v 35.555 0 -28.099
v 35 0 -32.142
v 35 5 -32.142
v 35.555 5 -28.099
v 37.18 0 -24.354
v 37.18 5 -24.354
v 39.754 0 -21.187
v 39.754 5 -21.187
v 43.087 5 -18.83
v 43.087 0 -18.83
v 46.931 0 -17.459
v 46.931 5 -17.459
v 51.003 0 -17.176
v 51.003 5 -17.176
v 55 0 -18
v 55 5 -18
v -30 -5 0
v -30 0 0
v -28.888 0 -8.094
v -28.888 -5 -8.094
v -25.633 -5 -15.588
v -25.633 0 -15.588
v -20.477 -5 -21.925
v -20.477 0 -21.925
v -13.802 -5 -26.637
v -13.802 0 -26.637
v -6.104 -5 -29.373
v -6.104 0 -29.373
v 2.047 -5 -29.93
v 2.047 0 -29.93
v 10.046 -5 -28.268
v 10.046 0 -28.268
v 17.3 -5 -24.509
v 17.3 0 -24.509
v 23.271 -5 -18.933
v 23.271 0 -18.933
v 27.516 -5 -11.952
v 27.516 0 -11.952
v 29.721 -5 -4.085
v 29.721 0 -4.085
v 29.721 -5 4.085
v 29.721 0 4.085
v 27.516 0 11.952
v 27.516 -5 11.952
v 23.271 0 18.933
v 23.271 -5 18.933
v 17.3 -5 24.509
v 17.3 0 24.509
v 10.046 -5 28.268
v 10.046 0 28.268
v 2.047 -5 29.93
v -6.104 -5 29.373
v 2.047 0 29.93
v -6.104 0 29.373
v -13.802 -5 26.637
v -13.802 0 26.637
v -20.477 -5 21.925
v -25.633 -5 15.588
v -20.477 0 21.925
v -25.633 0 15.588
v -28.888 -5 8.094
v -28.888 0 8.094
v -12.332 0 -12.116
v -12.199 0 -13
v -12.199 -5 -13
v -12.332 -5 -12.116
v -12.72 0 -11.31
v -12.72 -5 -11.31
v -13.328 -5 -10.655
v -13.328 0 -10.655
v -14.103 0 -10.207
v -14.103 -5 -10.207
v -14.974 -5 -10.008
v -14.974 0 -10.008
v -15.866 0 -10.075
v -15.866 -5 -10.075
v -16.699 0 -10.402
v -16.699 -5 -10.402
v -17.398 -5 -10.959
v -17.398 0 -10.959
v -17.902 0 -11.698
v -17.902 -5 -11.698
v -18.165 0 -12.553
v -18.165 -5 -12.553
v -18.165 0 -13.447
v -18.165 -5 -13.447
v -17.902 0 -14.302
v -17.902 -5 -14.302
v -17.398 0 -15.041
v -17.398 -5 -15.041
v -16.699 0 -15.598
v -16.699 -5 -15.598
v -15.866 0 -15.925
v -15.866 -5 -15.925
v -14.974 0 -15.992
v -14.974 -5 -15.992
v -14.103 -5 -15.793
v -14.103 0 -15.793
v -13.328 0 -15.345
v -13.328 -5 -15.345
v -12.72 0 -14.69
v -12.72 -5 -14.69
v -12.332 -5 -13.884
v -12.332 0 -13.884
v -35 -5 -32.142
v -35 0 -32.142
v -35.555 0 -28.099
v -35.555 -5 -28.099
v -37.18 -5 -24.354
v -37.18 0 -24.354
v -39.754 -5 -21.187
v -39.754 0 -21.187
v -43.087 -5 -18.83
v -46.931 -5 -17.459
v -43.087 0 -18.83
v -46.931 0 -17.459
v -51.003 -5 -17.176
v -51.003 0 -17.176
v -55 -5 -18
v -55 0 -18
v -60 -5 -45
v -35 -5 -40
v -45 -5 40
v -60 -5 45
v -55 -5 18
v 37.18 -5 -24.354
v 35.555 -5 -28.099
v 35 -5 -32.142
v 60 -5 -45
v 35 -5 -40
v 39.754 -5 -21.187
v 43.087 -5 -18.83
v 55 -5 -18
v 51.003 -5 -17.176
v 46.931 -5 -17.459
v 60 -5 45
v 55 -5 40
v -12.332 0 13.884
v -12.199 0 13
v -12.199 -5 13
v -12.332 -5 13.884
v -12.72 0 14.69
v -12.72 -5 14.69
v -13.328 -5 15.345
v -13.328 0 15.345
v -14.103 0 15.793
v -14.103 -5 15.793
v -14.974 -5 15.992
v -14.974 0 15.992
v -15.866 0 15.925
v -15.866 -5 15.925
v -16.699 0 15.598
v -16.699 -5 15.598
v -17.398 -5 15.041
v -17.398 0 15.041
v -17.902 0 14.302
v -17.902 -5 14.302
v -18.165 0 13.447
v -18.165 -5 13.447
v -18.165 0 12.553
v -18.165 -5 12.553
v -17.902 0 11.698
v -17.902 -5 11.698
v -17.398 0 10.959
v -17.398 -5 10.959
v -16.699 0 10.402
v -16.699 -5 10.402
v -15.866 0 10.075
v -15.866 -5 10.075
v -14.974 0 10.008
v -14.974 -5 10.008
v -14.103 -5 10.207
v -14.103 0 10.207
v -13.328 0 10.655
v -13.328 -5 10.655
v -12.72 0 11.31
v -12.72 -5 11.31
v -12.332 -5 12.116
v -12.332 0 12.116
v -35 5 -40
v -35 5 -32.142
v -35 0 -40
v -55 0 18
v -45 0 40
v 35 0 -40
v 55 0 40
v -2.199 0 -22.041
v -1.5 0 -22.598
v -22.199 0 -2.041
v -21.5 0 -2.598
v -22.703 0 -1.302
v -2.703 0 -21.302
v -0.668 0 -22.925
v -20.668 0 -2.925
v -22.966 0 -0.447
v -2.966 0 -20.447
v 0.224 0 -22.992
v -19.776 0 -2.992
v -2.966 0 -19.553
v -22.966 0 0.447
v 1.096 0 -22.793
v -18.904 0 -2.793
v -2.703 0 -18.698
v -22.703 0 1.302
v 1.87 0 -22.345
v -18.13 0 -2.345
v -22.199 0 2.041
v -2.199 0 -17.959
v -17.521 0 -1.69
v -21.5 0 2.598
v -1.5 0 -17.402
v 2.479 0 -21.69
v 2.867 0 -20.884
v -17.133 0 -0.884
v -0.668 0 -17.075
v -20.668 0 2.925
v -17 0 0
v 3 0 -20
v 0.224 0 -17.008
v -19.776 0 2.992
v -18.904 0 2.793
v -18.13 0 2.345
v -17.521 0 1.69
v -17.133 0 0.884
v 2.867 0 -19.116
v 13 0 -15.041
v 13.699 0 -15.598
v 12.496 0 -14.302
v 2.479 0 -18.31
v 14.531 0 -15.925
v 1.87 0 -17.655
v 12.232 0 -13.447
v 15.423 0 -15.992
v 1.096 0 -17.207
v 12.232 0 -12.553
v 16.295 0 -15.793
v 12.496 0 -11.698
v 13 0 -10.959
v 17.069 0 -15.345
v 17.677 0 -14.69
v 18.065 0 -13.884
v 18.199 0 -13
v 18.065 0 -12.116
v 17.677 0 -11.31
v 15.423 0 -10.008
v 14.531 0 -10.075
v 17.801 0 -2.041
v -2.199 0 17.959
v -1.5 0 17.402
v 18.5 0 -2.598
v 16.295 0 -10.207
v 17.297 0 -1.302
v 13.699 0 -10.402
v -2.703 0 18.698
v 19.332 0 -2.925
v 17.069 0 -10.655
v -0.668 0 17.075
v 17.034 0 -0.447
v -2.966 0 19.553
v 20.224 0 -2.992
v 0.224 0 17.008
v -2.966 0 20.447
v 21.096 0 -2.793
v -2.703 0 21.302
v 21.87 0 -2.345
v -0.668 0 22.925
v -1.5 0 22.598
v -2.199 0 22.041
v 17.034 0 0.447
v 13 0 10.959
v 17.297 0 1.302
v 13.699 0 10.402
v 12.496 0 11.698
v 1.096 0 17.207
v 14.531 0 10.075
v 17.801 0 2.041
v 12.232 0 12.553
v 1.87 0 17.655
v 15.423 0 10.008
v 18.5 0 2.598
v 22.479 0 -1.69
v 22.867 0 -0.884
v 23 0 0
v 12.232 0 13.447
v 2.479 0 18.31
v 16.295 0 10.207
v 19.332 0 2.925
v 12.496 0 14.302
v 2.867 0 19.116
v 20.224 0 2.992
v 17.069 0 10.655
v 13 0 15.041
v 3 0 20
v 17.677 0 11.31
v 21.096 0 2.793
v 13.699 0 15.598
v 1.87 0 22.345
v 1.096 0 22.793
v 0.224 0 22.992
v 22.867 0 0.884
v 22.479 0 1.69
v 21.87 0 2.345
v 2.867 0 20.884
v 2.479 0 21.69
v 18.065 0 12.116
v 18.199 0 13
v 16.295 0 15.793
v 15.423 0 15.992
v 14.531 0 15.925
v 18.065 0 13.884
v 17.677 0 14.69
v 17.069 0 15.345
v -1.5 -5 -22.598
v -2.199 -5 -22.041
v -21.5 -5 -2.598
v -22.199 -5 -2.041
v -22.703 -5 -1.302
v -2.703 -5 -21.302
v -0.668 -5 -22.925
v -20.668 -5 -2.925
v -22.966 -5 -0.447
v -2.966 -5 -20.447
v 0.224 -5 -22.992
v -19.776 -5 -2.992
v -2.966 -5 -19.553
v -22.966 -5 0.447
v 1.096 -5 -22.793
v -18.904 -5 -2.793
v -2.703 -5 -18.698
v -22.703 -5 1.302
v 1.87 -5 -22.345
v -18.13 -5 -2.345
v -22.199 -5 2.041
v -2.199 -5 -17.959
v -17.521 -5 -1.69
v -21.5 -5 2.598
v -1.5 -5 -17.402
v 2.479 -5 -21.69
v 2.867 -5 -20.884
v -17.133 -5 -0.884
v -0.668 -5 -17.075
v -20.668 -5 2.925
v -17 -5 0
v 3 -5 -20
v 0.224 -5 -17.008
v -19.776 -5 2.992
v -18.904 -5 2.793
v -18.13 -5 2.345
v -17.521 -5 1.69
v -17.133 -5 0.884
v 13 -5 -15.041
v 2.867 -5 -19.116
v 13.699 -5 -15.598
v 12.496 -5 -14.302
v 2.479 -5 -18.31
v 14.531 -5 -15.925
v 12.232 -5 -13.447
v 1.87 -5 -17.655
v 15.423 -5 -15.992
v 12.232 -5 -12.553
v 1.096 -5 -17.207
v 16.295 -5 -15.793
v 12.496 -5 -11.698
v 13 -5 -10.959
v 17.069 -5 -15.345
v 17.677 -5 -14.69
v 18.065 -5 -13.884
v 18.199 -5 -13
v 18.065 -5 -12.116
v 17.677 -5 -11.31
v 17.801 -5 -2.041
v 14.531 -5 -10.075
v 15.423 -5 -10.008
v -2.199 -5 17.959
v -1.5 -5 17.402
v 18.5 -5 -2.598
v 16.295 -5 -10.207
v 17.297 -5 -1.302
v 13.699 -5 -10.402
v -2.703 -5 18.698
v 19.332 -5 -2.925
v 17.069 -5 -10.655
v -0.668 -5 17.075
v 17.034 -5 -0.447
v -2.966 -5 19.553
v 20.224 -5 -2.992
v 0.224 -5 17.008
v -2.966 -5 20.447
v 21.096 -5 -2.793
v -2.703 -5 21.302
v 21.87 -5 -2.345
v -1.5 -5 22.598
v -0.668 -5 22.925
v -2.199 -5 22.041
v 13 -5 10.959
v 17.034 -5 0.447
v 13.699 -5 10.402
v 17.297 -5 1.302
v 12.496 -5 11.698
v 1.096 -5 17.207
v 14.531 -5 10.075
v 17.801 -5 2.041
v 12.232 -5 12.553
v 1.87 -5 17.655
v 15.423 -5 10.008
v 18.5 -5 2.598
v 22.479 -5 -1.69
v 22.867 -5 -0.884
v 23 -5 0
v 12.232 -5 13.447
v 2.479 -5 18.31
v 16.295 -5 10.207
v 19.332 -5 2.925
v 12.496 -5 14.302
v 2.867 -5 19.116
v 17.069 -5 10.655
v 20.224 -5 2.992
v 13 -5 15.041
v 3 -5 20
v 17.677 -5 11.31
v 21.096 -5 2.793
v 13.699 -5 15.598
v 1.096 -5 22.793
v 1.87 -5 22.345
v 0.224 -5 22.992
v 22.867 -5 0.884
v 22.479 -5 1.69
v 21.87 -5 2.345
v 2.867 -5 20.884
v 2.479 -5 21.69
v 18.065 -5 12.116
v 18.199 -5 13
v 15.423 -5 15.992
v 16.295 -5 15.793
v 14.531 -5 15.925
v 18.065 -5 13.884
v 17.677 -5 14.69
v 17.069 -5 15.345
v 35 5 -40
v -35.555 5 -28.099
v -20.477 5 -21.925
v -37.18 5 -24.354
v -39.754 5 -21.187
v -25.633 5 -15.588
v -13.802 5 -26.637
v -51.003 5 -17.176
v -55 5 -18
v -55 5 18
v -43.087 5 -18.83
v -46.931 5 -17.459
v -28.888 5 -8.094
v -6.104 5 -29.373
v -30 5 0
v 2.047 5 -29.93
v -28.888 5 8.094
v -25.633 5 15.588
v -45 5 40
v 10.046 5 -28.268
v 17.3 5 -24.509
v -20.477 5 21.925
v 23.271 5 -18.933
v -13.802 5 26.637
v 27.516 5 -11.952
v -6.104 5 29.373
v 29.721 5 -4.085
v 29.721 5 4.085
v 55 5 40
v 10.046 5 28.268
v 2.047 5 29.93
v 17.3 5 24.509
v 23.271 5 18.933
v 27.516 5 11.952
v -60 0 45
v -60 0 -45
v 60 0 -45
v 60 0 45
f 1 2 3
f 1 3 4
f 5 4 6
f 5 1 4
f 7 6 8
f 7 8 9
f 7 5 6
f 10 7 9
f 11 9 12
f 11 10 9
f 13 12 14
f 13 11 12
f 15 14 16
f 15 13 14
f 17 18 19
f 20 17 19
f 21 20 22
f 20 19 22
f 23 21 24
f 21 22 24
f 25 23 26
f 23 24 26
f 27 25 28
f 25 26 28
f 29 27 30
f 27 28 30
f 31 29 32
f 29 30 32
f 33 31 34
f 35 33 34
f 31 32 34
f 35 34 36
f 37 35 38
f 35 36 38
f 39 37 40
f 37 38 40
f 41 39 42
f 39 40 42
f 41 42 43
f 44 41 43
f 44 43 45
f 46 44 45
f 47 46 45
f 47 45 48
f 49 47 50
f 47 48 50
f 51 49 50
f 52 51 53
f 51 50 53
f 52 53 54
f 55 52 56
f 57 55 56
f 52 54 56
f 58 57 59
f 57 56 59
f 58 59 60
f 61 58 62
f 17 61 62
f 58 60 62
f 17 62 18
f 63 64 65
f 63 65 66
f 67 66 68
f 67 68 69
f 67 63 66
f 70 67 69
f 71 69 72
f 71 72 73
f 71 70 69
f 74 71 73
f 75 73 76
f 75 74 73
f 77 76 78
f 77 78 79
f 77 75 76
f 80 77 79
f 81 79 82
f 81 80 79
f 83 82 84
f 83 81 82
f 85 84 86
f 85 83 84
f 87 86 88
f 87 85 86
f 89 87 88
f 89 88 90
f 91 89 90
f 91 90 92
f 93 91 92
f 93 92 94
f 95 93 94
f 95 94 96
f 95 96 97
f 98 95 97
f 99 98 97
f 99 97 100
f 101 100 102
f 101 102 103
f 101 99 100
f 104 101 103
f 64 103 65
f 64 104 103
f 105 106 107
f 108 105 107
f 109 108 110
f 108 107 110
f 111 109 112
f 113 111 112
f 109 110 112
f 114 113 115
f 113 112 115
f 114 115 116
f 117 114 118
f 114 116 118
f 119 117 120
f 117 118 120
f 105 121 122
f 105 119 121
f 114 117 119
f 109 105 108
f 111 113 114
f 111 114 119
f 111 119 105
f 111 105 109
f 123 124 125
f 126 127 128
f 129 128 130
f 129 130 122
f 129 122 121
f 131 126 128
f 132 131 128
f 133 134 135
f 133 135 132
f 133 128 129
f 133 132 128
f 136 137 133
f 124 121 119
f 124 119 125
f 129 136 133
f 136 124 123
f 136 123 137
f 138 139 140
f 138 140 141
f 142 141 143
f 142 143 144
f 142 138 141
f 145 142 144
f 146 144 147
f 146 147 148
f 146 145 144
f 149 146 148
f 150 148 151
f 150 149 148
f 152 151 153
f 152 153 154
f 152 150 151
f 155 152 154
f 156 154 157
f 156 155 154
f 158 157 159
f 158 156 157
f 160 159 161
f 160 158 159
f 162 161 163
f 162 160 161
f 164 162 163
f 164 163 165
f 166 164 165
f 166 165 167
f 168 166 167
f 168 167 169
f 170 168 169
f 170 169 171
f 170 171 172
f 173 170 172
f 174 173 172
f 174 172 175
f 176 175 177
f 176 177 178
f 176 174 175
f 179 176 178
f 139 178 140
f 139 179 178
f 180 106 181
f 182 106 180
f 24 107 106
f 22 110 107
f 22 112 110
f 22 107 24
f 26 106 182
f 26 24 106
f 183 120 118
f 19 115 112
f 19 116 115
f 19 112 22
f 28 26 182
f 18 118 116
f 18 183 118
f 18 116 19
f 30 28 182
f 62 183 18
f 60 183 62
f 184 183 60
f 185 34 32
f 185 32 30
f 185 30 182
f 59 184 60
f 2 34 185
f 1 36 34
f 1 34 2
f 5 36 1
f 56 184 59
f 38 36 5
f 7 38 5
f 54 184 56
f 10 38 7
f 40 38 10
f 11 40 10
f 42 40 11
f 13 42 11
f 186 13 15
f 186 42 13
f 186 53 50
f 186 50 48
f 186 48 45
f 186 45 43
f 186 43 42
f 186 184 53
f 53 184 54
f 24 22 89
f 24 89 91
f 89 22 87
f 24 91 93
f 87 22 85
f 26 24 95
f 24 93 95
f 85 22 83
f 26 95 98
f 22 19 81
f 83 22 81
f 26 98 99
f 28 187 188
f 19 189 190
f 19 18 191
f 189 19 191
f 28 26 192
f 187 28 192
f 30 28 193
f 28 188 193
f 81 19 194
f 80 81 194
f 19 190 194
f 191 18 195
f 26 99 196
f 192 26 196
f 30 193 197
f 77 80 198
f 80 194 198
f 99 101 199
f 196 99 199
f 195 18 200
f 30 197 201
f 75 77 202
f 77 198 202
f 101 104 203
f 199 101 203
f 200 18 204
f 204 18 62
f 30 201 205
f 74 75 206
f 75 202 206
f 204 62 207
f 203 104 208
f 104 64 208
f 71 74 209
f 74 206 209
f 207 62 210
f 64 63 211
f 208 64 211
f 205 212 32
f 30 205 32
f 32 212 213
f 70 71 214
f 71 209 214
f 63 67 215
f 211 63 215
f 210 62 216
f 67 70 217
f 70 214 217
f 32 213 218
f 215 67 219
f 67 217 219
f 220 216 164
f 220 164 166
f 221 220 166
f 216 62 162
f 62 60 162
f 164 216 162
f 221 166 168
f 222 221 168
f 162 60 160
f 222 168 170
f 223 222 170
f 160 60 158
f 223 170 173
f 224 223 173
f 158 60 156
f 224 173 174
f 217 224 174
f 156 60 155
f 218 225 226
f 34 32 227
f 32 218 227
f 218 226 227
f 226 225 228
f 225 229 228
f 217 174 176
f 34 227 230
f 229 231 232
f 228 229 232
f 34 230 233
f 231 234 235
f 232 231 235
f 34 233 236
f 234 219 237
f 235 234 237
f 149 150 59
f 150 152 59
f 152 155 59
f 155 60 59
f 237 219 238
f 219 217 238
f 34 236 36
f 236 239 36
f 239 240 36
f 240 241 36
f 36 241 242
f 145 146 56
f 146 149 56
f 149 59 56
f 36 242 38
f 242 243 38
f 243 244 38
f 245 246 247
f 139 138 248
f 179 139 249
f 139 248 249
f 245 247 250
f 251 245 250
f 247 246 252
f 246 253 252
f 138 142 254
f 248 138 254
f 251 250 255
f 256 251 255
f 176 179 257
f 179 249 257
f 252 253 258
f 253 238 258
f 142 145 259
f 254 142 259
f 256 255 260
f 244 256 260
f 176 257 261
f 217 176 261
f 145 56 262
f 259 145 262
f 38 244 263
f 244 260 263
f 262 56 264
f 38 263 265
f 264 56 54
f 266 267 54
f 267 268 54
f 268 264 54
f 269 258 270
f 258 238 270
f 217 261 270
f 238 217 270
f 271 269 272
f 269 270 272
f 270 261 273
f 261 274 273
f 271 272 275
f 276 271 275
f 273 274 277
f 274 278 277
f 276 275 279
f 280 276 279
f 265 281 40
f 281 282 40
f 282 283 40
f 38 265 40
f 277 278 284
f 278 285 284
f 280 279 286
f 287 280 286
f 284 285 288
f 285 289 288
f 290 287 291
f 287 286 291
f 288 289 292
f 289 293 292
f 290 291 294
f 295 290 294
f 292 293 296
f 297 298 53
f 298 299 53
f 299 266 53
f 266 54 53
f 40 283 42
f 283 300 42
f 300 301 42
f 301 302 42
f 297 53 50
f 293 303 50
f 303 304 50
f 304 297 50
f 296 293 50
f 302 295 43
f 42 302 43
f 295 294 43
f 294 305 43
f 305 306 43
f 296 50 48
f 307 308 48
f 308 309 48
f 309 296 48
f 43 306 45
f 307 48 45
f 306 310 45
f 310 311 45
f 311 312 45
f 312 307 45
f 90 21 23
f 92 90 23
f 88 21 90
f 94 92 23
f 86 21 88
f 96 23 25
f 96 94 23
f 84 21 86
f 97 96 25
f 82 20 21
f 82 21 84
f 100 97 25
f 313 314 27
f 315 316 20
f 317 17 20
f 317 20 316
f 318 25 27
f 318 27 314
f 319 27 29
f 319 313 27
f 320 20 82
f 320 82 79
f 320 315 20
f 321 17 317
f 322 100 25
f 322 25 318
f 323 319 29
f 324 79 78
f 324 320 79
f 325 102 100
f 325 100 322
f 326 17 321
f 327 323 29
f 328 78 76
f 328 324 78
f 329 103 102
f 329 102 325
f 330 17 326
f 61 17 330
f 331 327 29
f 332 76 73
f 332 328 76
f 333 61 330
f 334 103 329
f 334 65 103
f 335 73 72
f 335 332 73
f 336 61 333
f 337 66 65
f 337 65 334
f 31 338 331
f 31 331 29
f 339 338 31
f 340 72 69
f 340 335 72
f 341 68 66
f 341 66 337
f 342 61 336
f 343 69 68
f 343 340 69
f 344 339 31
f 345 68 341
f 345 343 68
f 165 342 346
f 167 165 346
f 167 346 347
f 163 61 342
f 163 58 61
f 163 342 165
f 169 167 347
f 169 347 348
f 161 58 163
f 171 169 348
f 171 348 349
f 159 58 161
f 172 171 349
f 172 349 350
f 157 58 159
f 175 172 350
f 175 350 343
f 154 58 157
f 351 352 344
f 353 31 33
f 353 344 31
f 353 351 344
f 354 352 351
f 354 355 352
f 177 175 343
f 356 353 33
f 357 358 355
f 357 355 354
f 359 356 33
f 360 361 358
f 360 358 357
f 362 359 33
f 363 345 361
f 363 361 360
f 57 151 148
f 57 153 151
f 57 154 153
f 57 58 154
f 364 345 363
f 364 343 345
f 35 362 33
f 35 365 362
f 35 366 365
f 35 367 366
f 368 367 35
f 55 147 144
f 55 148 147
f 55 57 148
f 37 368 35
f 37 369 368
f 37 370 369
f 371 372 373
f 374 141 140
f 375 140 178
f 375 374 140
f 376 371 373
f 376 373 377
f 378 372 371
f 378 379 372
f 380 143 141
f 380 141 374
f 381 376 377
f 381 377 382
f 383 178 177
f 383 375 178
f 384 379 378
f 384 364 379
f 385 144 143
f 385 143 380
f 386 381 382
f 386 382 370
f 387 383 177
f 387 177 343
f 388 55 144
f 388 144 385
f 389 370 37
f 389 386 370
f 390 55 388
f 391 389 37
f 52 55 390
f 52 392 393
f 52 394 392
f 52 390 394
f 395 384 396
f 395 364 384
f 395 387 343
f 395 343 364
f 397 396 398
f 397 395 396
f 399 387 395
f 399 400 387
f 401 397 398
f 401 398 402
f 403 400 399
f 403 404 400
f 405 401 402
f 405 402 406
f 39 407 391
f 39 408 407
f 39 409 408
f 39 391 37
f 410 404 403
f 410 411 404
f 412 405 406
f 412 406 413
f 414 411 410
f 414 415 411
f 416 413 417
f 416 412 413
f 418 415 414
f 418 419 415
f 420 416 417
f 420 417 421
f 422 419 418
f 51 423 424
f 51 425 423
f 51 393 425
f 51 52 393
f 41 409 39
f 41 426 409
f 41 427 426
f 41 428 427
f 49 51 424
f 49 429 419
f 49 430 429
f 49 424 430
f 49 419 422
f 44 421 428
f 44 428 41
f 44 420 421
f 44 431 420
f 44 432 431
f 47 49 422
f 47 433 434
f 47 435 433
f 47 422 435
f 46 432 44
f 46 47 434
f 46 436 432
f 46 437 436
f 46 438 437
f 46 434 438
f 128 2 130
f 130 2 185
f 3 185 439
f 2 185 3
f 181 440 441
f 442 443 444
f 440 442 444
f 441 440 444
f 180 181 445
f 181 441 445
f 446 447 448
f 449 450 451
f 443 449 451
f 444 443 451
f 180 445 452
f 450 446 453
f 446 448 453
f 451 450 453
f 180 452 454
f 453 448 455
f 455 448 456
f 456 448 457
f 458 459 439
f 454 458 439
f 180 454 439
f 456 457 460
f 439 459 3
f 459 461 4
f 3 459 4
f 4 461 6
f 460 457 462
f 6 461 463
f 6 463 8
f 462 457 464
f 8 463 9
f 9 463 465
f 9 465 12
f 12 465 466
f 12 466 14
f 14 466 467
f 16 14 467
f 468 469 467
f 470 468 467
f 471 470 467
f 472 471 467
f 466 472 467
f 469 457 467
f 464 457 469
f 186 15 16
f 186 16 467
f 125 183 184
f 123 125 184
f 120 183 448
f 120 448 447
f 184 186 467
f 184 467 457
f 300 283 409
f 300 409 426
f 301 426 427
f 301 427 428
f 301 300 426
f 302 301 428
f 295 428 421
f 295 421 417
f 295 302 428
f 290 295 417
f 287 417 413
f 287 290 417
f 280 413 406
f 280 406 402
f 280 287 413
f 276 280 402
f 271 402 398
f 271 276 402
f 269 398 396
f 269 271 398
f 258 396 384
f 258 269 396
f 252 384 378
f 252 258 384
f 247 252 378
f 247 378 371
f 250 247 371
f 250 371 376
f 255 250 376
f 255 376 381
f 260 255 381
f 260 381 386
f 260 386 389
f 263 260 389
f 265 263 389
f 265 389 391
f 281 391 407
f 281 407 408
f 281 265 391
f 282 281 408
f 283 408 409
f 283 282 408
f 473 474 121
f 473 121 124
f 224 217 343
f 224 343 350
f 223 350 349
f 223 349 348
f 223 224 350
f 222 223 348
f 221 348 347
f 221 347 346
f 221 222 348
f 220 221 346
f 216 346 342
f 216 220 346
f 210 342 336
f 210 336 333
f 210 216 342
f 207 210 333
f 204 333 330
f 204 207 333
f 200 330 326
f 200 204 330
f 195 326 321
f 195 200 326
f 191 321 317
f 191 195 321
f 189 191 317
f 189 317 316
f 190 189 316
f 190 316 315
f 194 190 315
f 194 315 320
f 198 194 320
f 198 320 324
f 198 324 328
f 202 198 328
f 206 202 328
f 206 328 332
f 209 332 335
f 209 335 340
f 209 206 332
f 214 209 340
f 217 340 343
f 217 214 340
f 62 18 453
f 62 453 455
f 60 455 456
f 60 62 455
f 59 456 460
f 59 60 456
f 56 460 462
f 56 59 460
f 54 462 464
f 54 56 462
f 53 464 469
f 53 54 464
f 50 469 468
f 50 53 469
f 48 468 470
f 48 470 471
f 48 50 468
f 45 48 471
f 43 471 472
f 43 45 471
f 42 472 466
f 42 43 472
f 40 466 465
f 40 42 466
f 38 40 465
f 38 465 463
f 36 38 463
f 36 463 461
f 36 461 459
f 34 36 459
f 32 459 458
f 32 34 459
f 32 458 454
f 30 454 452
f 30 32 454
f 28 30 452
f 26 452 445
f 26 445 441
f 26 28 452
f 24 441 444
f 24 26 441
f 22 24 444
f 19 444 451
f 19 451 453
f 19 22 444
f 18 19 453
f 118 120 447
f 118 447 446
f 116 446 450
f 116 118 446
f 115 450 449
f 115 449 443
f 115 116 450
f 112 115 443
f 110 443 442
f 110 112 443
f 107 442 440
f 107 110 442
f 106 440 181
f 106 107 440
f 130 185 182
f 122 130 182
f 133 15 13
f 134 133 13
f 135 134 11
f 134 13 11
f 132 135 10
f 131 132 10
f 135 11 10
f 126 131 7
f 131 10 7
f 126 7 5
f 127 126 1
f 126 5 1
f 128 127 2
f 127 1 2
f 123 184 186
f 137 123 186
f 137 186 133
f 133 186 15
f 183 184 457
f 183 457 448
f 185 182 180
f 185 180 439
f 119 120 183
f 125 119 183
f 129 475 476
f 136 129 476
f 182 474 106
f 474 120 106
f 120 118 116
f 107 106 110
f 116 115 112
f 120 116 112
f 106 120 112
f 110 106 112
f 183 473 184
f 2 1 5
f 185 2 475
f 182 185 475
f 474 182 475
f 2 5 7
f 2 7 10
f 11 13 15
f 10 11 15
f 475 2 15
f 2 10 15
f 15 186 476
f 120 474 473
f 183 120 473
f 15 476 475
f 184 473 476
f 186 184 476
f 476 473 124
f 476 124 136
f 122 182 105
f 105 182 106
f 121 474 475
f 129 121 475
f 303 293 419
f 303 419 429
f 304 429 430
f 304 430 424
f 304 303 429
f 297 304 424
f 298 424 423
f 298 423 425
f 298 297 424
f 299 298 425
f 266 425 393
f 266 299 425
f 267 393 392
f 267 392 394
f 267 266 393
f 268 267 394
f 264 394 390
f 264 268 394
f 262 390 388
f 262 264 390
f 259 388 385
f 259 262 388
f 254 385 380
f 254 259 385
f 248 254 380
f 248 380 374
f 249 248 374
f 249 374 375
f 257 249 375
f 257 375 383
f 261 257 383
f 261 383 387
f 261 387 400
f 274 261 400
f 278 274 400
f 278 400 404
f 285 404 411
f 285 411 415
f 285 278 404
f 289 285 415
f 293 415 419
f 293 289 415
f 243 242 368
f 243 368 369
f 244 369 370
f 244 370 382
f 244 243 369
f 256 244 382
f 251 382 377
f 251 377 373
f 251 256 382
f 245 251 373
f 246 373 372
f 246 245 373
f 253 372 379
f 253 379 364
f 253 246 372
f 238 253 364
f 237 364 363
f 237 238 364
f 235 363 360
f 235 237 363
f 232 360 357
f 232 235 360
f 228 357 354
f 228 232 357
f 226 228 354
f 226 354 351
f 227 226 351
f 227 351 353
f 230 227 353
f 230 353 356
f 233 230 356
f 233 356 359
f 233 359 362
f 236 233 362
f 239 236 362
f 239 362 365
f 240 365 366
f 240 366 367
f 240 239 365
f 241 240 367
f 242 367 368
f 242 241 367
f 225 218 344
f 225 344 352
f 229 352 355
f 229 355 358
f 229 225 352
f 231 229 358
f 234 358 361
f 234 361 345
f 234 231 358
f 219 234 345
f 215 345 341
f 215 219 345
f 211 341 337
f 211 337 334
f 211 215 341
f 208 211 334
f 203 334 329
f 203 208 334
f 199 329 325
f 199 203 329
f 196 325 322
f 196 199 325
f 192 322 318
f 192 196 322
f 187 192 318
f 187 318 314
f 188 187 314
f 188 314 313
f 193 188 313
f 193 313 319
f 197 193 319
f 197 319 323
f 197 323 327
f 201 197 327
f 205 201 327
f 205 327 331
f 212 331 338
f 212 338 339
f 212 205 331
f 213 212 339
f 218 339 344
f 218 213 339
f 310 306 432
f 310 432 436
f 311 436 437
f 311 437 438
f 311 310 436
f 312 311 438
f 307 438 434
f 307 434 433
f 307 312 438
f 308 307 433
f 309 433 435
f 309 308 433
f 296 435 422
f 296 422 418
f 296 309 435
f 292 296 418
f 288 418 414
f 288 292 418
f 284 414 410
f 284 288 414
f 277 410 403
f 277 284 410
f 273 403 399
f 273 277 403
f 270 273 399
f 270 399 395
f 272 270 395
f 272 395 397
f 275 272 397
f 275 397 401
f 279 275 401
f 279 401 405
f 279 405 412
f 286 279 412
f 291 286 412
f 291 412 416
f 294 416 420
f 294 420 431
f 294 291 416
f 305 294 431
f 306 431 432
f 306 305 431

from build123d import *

# Parameters (mm, degrees)
F0_W     = 120
F0_H     = 90
F1_DEPTH = 5
F2_DEPTH = 5
F0_R     = 3
F3_DEPTH = 25
F4_DEPTH = 5
F5_DEPTH = 5


with BuildPart() as f1:
    # F0 (on Front) → F1 (new body)
    with BuildSketch(Plane.XZ):
        Rectangle(F0_W, F0_H)
        with BuildLine():
            Line((-55, -18), (-55, 18))
            Line((-55, 18), (-45, 40))
            Line((-45, 40), (55, 40))
            Line((55, 40), (55, 0))
            Line((55, 0), (55, -18))
            ThreePointArc((55, -18), (41.339746, -19.894687), (35, -32.142136))
            Line((35, -32.142136), (35, -40))
            Line((35, -40), (-35, -40))
            Line((-35, -40), (-35, -32.142136))
            ThreePointArc((-35, -32.142136), (-41.339746, -19.894687), (-55, -18))
        make_face(mode=Mode.SUBTRACT)
    extrude(amount=F1_DEPTH)

    # F0 (on Front) → F2 (join)
    with BuildSketch(Plane.XZ):
        with BuildLine():
            Line((-45, 40), (-55, 18))
            Line((-55, 18), (-55, -18))
            ThreePointArc((-55, -18), (-41.339746, -19.894687), (-35, -32.142136))
            Line((-35, -32.142136), (-35, -40))
            Line((-35, -40), (35, -40))
            Line((35, -40), (35, -32.142136))
            ThreePointArc((35, -32.142136), (41.339746, -19.894687), (55, -18))
            Line((55, -18), (55, 0))
            Line((55, 0), (55, 40))
            Line((55, 40), (-45, 40))
        make_face()
        with BuildLine():
            ThreePointArc((30, 0), (0, -30), (-30, 0))
            ThreePointArc((-30, 0), (0, 30), (30, 0))
        make_face(mode=Mode.SUBTRACT)
    extrude(amount=-F2_DEPTH)

    # F0 (on Front) → F3 (cut)
    with BuildSketch(Plane.XZ):
        with Locations((-15.198684, 13)):
            Circle(F0_R)
        with Locations((0, 20)):
            Circle(F0_R)
        with Locations((15.198684, 13)):
            Circle(F0_R)
        with Locations((20, 0)):
            Circle(F0_R)
        with Locations((15.198684, -13)):
            Circle(F0_R)
        with Locations((0, -20)):
            Circle(F0_R)
        with Locations((-15.198684, -13)):
            Circle(F0_R)
        with Locations((-20, 0)):
            Circle(F0_R)
    extrude(amount=F3_DEPTH, mode=Mode.SUBTRACT)

    # F0 (on Front) → F4 (cut)
    with BuildSketch(Plane.XZ):
        with BuildLine():
            ThreePointArc((30, 0), (0, 30), (-30, 0))
            ThreePointArc((-30, 0), (0, -30), (30, 0))
        make_face()
        with Locations((-15.198684, -13)):
            Circle(F0_R, mode=Mode.SUBTRACT)
        with Locations((0, -20)):
            Circle(F0_R, mode=Mode.SUBTRACT)
        with Locations((15.198684, -13)):
            Circle(F0_R, mode=Mode.SUBTRACT)
        with Locations((-20, 0)):
            Circle(F0_R, mode=Mode.SUBTRACT)
        with Locations((-15.198684, 13)):
            Circle(F0_R, mode=Mode.SUBTRACT)
        with Locations((20, 0)):
            Circle(F0_R, mode=Mode.SUBTRACT)
        with Locations((0, 20)):
            Circle(F0_R, mode=Mode.SUBTRACT)
        with Locations((15.198684, 13)):
            Circle(F0_R, mode=Mode.SUBTRACT)
    extrude(amount=-F4_DEPTH, mode=Mode.SUBTRACT)


with BuildPart() as f5:
    # F0 (on Front) → F5 (new body)
    with BuildSketch(Plane.XZ):
        with BuildLine():
            ThreePointArc((30, 0), (0, 30), (-30, 0))
            ThreePointArc((-30, 0), (0, -30), (30, 0))
        make_face()
        with Locations((-15.198684, -13)):
            Circle(F0_R, mode=Mode.SUBTRACT)
        with Locations((0, -20)):
            Circle(F0_R, mode=Mode.SUBTRACT)
        with Locations((15.198684, -13)):
            Circle(F0_R, mode=Mode.SUBTRACT)
        with Locations((-20, 0)):
            Circle(F0_R, mode=Mode.SUBTRACT)
        with Locations((-15.198684, 13)):
            Circle(F0_R, mode=Mode.SUBTRACT)
        with Locations((20, 0)):
            Circle(F0_R, mode=Mode.SUBTRACT)
        with Locations((0, 20)):
            Circle(F0_R, mode=Mode.SUBTRACT)
        with Locations((15.198684, 13)):
            Circle(F0_R, mode=Mode.SUBTRACT)
    extrude(amount=F5_DEPTH)


solid = Compound([f1.part, f5.part])
